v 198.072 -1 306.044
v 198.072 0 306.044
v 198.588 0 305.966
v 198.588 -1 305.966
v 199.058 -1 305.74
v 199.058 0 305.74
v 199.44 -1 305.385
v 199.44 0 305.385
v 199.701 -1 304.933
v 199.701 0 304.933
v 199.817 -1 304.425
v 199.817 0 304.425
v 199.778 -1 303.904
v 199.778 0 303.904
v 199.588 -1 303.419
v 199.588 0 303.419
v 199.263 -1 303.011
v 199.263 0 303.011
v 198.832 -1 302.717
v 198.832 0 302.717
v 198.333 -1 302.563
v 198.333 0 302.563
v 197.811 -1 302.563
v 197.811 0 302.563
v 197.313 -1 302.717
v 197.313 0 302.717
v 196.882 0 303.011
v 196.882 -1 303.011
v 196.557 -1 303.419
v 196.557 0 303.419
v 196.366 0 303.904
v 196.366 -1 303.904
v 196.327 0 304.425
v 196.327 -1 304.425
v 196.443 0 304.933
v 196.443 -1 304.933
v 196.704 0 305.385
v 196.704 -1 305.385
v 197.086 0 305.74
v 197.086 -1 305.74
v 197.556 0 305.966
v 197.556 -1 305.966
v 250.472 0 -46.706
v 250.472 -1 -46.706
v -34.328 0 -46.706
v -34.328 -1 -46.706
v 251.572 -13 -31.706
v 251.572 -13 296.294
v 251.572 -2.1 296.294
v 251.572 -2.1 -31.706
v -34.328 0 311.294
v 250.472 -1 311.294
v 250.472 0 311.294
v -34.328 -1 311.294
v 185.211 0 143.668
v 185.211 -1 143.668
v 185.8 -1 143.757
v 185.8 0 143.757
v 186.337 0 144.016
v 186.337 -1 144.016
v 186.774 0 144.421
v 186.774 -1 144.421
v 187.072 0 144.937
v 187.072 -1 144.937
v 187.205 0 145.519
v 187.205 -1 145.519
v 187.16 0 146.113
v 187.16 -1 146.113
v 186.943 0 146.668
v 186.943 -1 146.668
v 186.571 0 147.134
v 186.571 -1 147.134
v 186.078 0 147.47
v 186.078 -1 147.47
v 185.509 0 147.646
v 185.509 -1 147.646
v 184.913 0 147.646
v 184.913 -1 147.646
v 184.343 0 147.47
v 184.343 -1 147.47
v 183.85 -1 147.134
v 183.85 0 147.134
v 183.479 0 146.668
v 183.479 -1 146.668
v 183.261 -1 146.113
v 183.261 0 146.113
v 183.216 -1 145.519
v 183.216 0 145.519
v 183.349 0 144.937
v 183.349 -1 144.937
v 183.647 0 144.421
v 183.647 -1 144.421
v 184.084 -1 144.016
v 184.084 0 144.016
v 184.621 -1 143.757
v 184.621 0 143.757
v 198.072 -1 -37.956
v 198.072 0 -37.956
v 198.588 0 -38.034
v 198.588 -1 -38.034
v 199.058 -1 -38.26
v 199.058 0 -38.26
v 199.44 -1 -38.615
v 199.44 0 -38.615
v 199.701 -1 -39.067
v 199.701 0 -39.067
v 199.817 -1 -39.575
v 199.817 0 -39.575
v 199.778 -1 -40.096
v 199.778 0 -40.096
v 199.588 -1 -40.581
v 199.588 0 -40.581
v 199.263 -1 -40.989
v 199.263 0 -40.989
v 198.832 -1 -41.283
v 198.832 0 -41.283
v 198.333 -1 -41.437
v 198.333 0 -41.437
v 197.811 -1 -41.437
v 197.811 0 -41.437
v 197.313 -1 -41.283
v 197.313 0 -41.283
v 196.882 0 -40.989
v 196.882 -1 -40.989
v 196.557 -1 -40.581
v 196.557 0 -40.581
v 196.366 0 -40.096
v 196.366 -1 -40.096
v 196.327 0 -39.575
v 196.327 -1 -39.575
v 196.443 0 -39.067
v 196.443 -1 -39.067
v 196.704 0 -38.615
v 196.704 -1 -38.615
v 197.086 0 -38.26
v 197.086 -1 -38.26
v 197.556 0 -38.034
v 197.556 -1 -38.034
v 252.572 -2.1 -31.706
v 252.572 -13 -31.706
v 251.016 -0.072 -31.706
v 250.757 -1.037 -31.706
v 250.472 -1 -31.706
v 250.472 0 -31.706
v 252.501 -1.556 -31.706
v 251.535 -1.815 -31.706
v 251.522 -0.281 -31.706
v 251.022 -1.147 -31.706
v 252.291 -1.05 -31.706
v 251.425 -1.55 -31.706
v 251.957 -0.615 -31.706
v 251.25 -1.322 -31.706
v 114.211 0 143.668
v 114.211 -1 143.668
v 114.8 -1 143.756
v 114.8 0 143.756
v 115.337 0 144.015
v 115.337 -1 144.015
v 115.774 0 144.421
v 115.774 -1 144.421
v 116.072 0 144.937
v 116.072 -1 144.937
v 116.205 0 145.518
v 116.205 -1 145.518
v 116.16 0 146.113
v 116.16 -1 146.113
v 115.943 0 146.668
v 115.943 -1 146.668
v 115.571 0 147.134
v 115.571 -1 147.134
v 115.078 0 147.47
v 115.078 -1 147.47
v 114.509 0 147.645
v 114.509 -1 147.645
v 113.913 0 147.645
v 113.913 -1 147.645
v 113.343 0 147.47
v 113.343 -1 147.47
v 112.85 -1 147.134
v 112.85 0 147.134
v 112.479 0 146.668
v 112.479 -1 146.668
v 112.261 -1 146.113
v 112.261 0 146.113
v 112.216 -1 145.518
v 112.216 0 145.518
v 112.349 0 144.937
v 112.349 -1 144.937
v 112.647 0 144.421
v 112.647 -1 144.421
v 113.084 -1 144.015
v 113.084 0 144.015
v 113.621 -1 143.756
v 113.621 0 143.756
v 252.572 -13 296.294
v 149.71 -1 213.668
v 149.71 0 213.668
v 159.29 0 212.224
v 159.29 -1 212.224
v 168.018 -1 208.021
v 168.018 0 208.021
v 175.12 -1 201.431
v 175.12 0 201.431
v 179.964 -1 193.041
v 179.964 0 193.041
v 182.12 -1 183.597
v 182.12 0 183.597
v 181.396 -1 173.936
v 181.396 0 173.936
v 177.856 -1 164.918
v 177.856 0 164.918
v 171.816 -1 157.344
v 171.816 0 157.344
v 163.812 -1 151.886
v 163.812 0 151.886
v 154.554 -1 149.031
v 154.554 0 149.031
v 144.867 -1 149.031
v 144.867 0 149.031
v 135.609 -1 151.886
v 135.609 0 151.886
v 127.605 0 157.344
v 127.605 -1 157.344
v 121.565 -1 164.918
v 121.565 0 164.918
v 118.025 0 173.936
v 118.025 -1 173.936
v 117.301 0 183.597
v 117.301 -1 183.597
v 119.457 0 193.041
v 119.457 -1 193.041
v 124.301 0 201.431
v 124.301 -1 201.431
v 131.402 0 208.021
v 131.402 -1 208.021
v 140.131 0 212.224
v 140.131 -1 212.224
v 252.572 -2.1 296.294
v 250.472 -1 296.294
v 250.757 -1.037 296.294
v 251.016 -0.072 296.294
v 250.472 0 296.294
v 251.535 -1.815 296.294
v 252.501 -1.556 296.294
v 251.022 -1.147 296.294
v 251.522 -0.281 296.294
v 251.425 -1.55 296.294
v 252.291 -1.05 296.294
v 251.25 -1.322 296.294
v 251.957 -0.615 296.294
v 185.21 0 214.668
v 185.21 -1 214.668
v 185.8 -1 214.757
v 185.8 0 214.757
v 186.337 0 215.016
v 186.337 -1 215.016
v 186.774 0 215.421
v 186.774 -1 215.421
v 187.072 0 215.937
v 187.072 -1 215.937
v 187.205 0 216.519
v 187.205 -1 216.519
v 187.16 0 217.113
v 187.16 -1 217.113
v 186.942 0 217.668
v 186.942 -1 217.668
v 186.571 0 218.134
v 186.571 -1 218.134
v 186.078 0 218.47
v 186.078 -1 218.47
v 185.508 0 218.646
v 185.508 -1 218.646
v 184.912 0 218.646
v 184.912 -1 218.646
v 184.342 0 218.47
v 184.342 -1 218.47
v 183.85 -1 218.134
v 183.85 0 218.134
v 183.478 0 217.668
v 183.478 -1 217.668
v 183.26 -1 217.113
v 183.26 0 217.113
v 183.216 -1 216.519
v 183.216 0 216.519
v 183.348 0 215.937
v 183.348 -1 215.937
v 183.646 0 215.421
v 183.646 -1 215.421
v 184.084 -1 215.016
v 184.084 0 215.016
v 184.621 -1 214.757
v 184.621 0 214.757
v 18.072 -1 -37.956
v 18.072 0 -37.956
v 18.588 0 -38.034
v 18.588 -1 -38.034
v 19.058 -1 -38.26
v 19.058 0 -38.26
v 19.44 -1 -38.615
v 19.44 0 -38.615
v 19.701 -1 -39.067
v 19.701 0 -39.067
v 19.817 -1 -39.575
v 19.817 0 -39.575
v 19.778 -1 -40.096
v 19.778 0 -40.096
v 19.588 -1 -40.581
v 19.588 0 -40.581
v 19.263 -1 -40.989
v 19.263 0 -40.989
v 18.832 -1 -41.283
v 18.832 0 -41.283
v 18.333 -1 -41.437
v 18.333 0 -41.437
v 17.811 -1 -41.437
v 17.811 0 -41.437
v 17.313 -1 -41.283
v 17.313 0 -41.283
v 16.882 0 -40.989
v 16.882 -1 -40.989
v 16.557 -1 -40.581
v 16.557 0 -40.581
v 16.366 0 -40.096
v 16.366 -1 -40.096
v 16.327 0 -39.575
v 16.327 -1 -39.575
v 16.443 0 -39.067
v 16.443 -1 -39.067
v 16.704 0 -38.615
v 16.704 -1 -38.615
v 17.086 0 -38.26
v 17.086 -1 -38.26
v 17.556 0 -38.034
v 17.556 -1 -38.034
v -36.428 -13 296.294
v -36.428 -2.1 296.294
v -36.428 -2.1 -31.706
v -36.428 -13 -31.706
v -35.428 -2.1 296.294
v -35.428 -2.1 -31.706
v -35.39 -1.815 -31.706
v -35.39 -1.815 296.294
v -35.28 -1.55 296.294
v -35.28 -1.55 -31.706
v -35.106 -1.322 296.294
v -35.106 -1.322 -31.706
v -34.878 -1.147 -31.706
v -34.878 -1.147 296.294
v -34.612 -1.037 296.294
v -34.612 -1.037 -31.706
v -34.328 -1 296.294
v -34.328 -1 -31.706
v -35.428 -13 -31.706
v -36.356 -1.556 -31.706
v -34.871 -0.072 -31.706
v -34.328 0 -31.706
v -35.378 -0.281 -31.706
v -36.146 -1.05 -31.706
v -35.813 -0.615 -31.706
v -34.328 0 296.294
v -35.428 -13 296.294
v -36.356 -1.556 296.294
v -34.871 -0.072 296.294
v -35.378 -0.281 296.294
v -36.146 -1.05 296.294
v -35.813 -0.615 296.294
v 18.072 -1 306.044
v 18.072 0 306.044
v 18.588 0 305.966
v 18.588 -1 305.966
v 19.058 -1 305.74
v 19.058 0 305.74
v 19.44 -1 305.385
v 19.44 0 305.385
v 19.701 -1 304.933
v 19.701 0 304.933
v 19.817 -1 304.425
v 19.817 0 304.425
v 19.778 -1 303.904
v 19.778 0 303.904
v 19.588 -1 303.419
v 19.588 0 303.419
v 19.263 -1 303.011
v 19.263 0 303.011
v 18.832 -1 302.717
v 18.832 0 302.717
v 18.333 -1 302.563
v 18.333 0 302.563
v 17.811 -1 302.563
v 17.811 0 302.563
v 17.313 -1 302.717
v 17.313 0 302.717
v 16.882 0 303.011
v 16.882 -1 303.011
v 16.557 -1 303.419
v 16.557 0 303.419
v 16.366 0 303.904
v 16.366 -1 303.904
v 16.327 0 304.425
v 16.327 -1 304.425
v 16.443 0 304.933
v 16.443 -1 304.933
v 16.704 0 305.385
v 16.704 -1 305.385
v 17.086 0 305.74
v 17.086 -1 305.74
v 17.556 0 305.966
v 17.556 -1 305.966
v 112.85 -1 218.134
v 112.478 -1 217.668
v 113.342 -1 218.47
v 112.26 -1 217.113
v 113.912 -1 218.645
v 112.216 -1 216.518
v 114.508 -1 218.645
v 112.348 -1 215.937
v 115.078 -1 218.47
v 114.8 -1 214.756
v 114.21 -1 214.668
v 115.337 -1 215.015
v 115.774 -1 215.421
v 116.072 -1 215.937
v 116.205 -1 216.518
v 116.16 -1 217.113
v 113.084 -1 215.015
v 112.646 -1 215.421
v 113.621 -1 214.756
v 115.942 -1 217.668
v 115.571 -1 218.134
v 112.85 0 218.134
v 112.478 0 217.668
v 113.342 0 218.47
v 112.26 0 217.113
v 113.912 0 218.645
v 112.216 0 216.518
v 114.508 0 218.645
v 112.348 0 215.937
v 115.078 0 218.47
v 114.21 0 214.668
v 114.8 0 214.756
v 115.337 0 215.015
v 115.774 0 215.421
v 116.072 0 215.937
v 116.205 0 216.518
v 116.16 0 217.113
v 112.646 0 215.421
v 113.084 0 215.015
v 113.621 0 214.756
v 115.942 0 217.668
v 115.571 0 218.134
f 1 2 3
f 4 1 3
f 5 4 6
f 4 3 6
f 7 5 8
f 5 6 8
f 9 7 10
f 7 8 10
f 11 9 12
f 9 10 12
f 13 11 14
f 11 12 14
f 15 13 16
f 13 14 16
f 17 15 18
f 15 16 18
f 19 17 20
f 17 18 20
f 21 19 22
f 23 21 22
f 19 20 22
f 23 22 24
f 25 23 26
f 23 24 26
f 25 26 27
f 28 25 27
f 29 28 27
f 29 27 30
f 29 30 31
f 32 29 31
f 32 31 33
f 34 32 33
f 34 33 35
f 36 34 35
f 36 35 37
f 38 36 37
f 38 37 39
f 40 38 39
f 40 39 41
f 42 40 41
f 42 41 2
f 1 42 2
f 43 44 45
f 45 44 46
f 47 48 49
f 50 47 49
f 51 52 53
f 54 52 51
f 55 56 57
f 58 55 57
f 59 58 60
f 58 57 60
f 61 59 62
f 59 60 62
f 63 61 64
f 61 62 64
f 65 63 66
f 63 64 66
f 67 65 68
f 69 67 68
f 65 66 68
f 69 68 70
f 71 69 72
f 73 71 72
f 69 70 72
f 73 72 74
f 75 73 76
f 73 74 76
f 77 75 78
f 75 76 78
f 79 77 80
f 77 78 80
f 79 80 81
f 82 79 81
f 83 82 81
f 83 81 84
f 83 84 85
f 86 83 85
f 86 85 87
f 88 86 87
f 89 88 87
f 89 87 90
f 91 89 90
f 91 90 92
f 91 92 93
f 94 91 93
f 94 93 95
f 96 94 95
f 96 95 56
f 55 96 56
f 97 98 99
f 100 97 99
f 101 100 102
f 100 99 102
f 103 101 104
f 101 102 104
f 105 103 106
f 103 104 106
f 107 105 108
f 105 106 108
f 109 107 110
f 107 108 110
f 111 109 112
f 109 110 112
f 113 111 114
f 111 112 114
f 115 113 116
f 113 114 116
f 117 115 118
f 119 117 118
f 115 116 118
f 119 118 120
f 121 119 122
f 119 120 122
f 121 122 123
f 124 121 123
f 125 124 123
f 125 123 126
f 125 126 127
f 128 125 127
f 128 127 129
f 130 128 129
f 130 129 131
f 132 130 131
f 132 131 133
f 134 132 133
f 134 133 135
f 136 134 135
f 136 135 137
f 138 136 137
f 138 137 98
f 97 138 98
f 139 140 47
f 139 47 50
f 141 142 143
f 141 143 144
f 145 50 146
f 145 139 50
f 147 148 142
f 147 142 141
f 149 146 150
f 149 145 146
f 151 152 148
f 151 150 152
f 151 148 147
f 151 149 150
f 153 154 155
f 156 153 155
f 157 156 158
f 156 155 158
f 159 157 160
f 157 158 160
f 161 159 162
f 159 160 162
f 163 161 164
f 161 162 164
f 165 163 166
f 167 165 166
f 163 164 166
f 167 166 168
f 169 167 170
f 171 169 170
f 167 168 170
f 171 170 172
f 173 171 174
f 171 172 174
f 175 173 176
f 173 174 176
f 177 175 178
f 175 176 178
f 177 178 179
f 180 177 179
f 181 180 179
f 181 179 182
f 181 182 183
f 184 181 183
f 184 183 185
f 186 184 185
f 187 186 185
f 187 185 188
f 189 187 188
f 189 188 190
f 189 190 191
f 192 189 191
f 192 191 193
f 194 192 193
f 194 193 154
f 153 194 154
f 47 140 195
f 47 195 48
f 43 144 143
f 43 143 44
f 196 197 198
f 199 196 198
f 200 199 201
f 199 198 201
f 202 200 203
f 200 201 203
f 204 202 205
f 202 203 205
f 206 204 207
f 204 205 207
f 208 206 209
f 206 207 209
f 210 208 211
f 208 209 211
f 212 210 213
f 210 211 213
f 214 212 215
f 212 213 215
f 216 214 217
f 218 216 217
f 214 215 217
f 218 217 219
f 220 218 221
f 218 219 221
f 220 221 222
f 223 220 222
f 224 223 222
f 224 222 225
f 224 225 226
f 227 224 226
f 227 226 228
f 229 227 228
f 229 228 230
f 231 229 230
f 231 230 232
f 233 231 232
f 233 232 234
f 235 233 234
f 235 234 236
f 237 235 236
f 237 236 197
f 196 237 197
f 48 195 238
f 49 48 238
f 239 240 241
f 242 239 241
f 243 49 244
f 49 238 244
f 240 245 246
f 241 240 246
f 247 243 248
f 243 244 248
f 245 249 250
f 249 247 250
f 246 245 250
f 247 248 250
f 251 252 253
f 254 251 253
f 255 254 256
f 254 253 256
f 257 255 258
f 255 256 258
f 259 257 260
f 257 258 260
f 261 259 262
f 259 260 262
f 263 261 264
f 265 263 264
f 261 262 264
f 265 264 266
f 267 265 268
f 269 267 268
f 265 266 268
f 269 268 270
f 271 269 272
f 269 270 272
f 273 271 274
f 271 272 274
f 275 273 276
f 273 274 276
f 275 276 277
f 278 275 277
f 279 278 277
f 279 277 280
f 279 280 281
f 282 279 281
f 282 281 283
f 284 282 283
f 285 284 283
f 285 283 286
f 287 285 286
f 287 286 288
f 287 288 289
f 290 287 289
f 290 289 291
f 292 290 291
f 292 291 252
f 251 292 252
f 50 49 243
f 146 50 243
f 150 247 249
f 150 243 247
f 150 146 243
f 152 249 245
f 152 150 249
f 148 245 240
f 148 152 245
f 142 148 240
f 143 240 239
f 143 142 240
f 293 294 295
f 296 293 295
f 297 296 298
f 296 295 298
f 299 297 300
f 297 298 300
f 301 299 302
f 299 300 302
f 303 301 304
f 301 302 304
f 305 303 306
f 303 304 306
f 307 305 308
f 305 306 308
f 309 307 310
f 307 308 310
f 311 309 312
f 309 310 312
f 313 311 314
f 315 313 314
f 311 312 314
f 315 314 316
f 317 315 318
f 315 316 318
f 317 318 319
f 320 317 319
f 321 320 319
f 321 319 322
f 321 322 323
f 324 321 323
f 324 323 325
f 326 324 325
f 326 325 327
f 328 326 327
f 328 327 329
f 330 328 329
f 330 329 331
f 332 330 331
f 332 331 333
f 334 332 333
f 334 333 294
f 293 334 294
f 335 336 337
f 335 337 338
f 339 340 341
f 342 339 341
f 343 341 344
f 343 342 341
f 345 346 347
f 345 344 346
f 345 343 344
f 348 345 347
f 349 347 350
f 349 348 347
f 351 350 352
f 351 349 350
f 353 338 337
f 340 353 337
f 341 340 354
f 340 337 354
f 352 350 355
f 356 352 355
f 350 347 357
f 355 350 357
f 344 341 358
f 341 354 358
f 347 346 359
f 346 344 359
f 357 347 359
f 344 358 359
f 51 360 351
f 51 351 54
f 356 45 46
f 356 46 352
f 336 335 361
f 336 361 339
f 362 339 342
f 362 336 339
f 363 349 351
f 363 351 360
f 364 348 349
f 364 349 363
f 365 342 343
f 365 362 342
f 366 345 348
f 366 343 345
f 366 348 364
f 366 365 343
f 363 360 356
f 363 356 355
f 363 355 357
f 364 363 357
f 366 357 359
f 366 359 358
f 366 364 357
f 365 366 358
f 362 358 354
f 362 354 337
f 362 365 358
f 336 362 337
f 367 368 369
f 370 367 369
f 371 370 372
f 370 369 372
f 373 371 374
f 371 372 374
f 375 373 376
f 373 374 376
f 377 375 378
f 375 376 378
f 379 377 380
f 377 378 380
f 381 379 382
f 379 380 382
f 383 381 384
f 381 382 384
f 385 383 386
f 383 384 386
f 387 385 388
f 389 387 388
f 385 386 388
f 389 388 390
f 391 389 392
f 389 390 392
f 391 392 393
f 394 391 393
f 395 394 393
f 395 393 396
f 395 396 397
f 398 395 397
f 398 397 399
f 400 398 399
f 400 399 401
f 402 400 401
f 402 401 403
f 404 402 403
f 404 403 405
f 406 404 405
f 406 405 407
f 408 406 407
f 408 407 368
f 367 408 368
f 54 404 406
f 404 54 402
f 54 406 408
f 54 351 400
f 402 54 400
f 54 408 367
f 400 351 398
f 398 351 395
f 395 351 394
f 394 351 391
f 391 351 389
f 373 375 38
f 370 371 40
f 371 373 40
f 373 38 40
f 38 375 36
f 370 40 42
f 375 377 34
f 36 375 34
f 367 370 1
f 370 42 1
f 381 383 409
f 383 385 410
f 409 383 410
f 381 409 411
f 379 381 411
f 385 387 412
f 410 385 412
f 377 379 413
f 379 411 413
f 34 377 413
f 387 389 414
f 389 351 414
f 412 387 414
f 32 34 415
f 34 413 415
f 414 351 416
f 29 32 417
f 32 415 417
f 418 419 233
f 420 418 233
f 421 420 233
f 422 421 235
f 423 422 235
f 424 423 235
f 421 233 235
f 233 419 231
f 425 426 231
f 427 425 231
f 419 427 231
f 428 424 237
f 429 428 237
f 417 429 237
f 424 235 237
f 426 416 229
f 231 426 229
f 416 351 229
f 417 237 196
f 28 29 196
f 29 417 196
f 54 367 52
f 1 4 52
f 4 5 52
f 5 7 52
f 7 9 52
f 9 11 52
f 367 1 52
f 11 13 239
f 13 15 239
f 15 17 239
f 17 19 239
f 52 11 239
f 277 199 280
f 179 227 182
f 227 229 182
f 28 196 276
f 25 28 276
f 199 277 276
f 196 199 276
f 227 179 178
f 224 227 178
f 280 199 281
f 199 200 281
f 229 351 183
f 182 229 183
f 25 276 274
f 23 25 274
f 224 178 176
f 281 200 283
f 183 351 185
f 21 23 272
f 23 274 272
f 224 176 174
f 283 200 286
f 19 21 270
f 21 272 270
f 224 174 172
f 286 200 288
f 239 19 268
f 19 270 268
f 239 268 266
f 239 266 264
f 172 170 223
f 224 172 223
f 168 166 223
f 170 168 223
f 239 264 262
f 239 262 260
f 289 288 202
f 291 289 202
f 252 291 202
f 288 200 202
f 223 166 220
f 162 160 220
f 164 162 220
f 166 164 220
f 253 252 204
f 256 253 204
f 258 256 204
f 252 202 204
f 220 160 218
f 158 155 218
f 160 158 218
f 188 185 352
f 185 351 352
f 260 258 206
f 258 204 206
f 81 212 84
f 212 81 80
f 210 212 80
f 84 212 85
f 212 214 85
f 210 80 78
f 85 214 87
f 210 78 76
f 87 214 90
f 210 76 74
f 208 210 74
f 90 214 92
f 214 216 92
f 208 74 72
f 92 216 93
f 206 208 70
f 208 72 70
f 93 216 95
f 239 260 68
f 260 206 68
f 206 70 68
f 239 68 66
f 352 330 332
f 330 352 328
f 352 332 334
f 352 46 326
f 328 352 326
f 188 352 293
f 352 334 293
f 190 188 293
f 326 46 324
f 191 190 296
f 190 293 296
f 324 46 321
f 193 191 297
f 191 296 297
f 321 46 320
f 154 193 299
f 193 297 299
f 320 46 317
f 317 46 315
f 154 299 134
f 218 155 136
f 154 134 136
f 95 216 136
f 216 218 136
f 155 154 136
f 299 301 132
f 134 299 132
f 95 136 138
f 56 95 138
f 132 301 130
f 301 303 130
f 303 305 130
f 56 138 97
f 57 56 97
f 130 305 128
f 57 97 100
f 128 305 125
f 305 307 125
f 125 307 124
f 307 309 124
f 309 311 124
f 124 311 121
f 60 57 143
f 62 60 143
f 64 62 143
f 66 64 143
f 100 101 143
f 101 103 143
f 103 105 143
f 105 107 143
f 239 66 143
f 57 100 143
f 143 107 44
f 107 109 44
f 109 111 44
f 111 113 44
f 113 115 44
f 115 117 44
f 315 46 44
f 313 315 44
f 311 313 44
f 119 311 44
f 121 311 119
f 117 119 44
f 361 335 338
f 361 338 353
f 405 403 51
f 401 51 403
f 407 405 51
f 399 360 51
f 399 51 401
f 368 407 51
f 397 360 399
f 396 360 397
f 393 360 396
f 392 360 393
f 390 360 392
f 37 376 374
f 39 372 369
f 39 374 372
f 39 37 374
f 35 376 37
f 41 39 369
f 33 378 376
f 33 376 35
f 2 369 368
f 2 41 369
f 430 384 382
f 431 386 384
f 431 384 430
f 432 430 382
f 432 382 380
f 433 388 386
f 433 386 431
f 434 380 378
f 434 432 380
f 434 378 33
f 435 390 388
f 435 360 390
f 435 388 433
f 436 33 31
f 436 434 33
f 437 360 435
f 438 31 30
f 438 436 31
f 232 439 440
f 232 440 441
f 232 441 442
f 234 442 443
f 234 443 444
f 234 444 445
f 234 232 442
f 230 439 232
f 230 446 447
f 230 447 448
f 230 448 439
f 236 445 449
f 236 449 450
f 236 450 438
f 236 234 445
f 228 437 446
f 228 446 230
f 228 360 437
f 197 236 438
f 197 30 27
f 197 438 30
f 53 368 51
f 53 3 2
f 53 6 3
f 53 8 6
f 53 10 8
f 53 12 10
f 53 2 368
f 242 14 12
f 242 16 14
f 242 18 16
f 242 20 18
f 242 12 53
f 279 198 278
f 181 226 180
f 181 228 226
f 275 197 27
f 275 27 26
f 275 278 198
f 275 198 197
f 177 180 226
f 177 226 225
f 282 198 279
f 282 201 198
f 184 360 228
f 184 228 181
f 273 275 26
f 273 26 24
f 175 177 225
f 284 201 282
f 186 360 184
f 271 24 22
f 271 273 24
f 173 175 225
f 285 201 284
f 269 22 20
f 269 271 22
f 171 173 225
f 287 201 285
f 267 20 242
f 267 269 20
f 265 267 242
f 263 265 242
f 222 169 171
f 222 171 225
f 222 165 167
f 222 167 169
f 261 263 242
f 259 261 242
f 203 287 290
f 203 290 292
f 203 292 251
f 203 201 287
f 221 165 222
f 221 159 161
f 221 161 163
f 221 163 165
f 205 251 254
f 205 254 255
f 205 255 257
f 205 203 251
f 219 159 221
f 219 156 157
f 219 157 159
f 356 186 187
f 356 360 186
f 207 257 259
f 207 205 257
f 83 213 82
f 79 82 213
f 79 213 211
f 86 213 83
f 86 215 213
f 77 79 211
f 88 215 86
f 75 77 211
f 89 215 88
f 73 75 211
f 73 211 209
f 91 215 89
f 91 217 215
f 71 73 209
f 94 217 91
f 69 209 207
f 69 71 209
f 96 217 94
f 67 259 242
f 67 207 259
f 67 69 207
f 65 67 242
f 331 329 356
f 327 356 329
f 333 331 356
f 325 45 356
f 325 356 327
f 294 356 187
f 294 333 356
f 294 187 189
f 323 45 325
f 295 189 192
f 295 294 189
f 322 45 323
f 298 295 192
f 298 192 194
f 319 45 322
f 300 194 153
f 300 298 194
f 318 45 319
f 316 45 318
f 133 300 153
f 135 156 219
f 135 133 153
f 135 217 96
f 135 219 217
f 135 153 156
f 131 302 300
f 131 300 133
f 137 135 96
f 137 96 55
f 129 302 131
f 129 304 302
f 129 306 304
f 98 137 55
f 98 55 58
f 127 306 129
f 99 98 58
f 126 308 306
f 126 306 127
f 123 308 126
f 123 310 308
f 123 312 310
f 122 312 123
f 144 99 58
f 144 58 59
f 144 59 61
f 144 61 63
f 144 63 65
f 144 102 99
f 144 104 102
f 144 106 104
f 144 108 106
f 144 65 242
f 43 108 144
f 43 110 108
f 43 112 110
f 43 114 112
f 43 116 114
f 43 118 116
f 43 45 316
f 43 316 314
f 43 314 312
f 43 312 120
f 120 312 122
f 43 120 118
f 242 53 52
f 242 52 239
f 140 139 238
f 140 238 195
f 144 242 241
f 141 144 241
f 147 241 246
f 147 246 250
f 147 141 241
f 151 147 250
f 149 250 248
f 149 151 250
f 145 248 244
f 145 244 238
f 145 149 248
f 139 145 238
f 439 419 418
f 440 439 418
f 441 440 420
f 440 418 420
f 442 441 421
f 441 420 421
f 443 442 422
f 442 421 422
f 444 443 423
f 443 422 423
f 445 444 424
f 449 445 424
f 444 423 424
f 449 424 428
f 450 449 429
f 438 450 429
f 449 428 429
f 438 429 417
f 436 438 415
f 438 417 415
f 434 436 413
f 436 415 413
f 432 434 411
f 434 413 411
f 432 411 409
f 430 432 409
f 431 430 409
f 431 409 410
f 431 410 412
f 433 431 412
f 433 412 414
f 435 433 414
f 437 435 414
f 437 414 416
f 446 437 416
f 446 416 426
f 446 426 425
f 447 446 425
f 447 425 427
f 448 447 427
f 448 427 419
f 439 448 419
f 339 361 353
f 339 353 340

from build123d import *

# Parameters (mm, degrees)
SKETCH_1_W                         = 287
SKETCH_1_H                         = 358
SM_BASE_FLANGE_1_DEPTH             = 1
SM_EDGE_FLANGE_1_STRIP_W           = 6.2
SM_EDGE_FLANGE_1_STRIP_H           = 1
SM_EDGE_FLANGE_1_STRIP_CUT_DEPTH   = 358
SM_EDGE_FLANGE_1_STRIP_2_W         = 6.2
SM_EDGE_FLANGE_1_STRIP_2_H         = 1
SM_EDGE_FLANGE_1_STRIP_CUT_2_DEPTH = 358
SM_EDGE_FLANGE_1_DEPTH             = 358
SM_EDGE_FLANGE_1_BEND_DEPTH        = 358
SKETCH_10_W                        = 15
SKETCH_10_H                        = 15
CUT_EXTRUDE_2_DEPTH                = 2.1
SKETCH_11_W                        = 15
SKETCH_11_H                        = 14.697316693
CUT_EXTRUDE_3_DEPTH                = 2.1
SKETCH_12_W                        = 15
SKETCH_12_H                        = 14.830573141
CUT_EXTRUDE_4_DEPTH                = 2.1
SKETCH_13_W                        = 15
SKETCH_13_H                        = 16.610777732
CUT_EXTRUDE_5_DEPTH                = 2.1
SKETCH_14_R                        = 1.75
CUT_EXTRUDE_6_DEPTH                = 10
SKETCH_15_R                        = 32.5
CUT_EXTRUDE_7_DEPTH                = 10
SKETCH_16_R                        = 2
CUT_EXTRUDE_8_DEPTH                = 10


# Sheet-metal steps are written as plain solids
with BuildPart() as part:
    # Sketch 1 → Базовая кромка1 (new body)
    with BuildSketch(Plane(origin=(0, 0, 0), x_dir=(1, 0, 0), z_dir=(0, 1, 0))):
        with Locations((108.072246785, -132.29374857)):
            Rectangle(SKETCH_1_W, SKETCH_1_H)
    extrude(amount=-SM_BASE_FLANGE_1_DEPTH)

    # Ребро-кромка1 strip (across the edge) → Ребро-кромка1 strip cut (cut)
    with BuildSketch(Plane(origin=(251.572246785, -1, -46.70625143), x_dir=(-1, 0, 0), z_dir=(0, 0, 1))):
        with Locations((-2, -0.5)):
            Rectangle(SM_EDGE_FLANGE_1_STRIP_W, SM_EDGE_FLANGE_1_STRIP_H)
    extrude(amount=SM_EDGE_FLANGE_1_STRIP_CUT_DEPTH, mode=Mode.SUBTRACT)

    # Ребро-кромка1 strip 2 (across the edge) → Ребро-кромка1 strip cut 2 (cut)
    with BuildSketch(Plane(origin=(-35.427753215, -1, 311.29374857), x_dir=(1, 0, 0), z_dir=(0, 0, -1))):
        with Locations((-2, -0.5)):
            Rectangle(SM_EDGE_FLANGE_1_STRIP_2_W, SM_EDGE_FLANGE_1_STRIP_2_H)
    extrude(amount=SM_EDGE_FLANGE_1_STRIP_CUT_2_DEPTH, mode=Mode.SUBTRACT)

    # Ребро-кромка1 section (across the edge) → Ребро-кромка1 (add)
    with BuildSketch(Plane(origin=(251.572246785, -1, -46.70625143), x_dir=(-1, 0, 0), z_dir=(0, 0, 1))):
        with BuildLine():
            Line((-1, 1.1), (-1, 12))
            Line((-1, 12), (0, 12))
            Line((0, 12), (0, 1.1))
            ThreePointArc((0, 1.1), (0.322182541, 0.322182541), (1.1, 0))
            Line((1.1, 0), (1.1, -1))
            ThreePointArc((1.1, -1), (-0.38492424, -0.38492424), (-1, 1.1))
        make_face()
    extrude(amount=SM_EDGE_FLANGE_1_DEPTH)

    # Ребро-кромка1 section 2 (across the edge) → Ребро-кромка1 bend (add)
    with BuildSketch(Plane(origin=(-35.427753215, -1, 311.29374857), x_dir=(1, 0, 0), z_dir=(0, 0, -1))):
        with BuildLine():
            Line((-1, 1.1), (-1, 12))
            Line((-1, 12), (0, 12))
            Line((0, 12), (0, 1.1))
            ThreePointArc((0, 1.1), (0.322182541, 0.322182541), (1.1, 0))
            Line((1.1, 0), (1.1, -1))
            ThreePointArc((1.1, -1), (-0.38492424, -0.38492424), (-1, 1.1))
        make_face()
    extrude(amount=SM_EDGE_FLANGE_1_BEND_DEPTH)

    # Эскиз10 → Вырез-Вытянуть2 (cut)
    with BuildSketch(Plane(origin=(252.572246785, 0, 0), x_dir=(0, 0, -1), z_dir=(1, 0, 0))):
        with Locations((39.20625143, -5.5)):
            Rectangle(SKETCH_10_W, SKETCH_10_H)
    extrude(amount=-CUT_EXTRUDE_2_DEPTH, mode=Mode.SUBTRACT)

    # Эскиз11 → Вырез-Вытянуть3 (cut)
    with BuildSketch(Plane(origin=(252.572246785, 0, 0), x_dir=(0, 0, -1), z_dir=(1, 0, 0))):
        with Locations((-303.79374857, -5.651341654)):
            Rectangle(SKETCH_11_W, SKETCH_11_H)
    extrude(amount=-CUT_EXTRUDE_3_DEPTH, mode=Mode.SUBTRACT)

    # Эскиз12 → Вырез-Вытянуть4 (cut)
    with BuildSketch(Plane.ZY.offset(36.427753215)):
        with Locations((303.79374857, -5.584713429)):
            Rectangle(SKETCH_12_W, SKETCH_12_H)
    extrude(amount=-CUT_EXTRUDE_4_DEPTH, mode=Mode.SUBTRACT)

    # Эскиз13 → Вырез-Вытянуть5 (cut)
    with BuildSketch(Plane.ZY.offset(36.427753215)):
        with Locations((-39.20625143, -4.694611134)):
            Rectangle(SKETCH_13_W, SKETCH_13_H)
    extrude(amount=-CUT_EXTRUDE_5_DEPTH, mode=Mode.SUBTRACT)

    # Эскиз14 → Вырез-Вытянуть6 (cut)
    with BuildSketch(Plane(origin=(0, 0, 0), x_dir=(1, 0, 0), z_dir=(0, 1, 0))):
        with Locations(Location((18.072246785, -304.29374857, 0), (0, 0, 270))):
            Circle(SKETCH_14_R)
        with Locations(Location((198.072246785, -304.29374857, 0), (0, 0, 270))):
            Circle(SKETCH_14_R)
        with Locations(Location((18.072246785, 39.70625143, 0), (0, 0, 270))):
            Circle(SKETCH_14_R)
        with Locations(Location((198.072246785, 39.70625143, 0), (0, 0, 270))):
            Circle(SKETCH_14_R)
    extrude(amount=-CUT_EXTRUDE_6_DEPTH, mode=Mode.SUBTRACT)

    # Эскиз15 → Вырез-Вытянуть7 (cut)
    with BuildSketch(Plane(origin=(0, 0, 0), x_dir=(1, 0, 0), z_dir=(0, 1, 0))):
        with Locations(Location((149.710381915, -181.167811182, 0), (0, 0, 270))):
            Circle(SKETCH_15_R)
    extrude(amount=-CUT_EXTRUDE_7_DEPTH, mode=Mode.SUBTRACT)

    # Эскиз16 → Вырез-Вытянуть8 (cut)
    with BuildSketch(Plane.XZ.offset(1)):
        with Locations(Location((114.21015579, 216.667585055, 0), (0, 0, 270))):
            Circle(SKETCH_16_R)
        with Locations(Location((185.210155788, 216.668037307, 0), (0, 0, 270))):
            Circle(SKETCH_16_R)
        with Locations(Location((114.210608042, 145.667585057, 0), (0, 0, 270))):
            Circle(SKETCH_16_R)
        with Locations(Location((185.21060804, 145.668037309, 0), (0, 0, 270))):
            Circle(SKETCH_16_R)
    extrude(amount=-CUT_EXTRUDE_8_DEPTH, mode=Mode.SUBTRACT)


solid = part.part
